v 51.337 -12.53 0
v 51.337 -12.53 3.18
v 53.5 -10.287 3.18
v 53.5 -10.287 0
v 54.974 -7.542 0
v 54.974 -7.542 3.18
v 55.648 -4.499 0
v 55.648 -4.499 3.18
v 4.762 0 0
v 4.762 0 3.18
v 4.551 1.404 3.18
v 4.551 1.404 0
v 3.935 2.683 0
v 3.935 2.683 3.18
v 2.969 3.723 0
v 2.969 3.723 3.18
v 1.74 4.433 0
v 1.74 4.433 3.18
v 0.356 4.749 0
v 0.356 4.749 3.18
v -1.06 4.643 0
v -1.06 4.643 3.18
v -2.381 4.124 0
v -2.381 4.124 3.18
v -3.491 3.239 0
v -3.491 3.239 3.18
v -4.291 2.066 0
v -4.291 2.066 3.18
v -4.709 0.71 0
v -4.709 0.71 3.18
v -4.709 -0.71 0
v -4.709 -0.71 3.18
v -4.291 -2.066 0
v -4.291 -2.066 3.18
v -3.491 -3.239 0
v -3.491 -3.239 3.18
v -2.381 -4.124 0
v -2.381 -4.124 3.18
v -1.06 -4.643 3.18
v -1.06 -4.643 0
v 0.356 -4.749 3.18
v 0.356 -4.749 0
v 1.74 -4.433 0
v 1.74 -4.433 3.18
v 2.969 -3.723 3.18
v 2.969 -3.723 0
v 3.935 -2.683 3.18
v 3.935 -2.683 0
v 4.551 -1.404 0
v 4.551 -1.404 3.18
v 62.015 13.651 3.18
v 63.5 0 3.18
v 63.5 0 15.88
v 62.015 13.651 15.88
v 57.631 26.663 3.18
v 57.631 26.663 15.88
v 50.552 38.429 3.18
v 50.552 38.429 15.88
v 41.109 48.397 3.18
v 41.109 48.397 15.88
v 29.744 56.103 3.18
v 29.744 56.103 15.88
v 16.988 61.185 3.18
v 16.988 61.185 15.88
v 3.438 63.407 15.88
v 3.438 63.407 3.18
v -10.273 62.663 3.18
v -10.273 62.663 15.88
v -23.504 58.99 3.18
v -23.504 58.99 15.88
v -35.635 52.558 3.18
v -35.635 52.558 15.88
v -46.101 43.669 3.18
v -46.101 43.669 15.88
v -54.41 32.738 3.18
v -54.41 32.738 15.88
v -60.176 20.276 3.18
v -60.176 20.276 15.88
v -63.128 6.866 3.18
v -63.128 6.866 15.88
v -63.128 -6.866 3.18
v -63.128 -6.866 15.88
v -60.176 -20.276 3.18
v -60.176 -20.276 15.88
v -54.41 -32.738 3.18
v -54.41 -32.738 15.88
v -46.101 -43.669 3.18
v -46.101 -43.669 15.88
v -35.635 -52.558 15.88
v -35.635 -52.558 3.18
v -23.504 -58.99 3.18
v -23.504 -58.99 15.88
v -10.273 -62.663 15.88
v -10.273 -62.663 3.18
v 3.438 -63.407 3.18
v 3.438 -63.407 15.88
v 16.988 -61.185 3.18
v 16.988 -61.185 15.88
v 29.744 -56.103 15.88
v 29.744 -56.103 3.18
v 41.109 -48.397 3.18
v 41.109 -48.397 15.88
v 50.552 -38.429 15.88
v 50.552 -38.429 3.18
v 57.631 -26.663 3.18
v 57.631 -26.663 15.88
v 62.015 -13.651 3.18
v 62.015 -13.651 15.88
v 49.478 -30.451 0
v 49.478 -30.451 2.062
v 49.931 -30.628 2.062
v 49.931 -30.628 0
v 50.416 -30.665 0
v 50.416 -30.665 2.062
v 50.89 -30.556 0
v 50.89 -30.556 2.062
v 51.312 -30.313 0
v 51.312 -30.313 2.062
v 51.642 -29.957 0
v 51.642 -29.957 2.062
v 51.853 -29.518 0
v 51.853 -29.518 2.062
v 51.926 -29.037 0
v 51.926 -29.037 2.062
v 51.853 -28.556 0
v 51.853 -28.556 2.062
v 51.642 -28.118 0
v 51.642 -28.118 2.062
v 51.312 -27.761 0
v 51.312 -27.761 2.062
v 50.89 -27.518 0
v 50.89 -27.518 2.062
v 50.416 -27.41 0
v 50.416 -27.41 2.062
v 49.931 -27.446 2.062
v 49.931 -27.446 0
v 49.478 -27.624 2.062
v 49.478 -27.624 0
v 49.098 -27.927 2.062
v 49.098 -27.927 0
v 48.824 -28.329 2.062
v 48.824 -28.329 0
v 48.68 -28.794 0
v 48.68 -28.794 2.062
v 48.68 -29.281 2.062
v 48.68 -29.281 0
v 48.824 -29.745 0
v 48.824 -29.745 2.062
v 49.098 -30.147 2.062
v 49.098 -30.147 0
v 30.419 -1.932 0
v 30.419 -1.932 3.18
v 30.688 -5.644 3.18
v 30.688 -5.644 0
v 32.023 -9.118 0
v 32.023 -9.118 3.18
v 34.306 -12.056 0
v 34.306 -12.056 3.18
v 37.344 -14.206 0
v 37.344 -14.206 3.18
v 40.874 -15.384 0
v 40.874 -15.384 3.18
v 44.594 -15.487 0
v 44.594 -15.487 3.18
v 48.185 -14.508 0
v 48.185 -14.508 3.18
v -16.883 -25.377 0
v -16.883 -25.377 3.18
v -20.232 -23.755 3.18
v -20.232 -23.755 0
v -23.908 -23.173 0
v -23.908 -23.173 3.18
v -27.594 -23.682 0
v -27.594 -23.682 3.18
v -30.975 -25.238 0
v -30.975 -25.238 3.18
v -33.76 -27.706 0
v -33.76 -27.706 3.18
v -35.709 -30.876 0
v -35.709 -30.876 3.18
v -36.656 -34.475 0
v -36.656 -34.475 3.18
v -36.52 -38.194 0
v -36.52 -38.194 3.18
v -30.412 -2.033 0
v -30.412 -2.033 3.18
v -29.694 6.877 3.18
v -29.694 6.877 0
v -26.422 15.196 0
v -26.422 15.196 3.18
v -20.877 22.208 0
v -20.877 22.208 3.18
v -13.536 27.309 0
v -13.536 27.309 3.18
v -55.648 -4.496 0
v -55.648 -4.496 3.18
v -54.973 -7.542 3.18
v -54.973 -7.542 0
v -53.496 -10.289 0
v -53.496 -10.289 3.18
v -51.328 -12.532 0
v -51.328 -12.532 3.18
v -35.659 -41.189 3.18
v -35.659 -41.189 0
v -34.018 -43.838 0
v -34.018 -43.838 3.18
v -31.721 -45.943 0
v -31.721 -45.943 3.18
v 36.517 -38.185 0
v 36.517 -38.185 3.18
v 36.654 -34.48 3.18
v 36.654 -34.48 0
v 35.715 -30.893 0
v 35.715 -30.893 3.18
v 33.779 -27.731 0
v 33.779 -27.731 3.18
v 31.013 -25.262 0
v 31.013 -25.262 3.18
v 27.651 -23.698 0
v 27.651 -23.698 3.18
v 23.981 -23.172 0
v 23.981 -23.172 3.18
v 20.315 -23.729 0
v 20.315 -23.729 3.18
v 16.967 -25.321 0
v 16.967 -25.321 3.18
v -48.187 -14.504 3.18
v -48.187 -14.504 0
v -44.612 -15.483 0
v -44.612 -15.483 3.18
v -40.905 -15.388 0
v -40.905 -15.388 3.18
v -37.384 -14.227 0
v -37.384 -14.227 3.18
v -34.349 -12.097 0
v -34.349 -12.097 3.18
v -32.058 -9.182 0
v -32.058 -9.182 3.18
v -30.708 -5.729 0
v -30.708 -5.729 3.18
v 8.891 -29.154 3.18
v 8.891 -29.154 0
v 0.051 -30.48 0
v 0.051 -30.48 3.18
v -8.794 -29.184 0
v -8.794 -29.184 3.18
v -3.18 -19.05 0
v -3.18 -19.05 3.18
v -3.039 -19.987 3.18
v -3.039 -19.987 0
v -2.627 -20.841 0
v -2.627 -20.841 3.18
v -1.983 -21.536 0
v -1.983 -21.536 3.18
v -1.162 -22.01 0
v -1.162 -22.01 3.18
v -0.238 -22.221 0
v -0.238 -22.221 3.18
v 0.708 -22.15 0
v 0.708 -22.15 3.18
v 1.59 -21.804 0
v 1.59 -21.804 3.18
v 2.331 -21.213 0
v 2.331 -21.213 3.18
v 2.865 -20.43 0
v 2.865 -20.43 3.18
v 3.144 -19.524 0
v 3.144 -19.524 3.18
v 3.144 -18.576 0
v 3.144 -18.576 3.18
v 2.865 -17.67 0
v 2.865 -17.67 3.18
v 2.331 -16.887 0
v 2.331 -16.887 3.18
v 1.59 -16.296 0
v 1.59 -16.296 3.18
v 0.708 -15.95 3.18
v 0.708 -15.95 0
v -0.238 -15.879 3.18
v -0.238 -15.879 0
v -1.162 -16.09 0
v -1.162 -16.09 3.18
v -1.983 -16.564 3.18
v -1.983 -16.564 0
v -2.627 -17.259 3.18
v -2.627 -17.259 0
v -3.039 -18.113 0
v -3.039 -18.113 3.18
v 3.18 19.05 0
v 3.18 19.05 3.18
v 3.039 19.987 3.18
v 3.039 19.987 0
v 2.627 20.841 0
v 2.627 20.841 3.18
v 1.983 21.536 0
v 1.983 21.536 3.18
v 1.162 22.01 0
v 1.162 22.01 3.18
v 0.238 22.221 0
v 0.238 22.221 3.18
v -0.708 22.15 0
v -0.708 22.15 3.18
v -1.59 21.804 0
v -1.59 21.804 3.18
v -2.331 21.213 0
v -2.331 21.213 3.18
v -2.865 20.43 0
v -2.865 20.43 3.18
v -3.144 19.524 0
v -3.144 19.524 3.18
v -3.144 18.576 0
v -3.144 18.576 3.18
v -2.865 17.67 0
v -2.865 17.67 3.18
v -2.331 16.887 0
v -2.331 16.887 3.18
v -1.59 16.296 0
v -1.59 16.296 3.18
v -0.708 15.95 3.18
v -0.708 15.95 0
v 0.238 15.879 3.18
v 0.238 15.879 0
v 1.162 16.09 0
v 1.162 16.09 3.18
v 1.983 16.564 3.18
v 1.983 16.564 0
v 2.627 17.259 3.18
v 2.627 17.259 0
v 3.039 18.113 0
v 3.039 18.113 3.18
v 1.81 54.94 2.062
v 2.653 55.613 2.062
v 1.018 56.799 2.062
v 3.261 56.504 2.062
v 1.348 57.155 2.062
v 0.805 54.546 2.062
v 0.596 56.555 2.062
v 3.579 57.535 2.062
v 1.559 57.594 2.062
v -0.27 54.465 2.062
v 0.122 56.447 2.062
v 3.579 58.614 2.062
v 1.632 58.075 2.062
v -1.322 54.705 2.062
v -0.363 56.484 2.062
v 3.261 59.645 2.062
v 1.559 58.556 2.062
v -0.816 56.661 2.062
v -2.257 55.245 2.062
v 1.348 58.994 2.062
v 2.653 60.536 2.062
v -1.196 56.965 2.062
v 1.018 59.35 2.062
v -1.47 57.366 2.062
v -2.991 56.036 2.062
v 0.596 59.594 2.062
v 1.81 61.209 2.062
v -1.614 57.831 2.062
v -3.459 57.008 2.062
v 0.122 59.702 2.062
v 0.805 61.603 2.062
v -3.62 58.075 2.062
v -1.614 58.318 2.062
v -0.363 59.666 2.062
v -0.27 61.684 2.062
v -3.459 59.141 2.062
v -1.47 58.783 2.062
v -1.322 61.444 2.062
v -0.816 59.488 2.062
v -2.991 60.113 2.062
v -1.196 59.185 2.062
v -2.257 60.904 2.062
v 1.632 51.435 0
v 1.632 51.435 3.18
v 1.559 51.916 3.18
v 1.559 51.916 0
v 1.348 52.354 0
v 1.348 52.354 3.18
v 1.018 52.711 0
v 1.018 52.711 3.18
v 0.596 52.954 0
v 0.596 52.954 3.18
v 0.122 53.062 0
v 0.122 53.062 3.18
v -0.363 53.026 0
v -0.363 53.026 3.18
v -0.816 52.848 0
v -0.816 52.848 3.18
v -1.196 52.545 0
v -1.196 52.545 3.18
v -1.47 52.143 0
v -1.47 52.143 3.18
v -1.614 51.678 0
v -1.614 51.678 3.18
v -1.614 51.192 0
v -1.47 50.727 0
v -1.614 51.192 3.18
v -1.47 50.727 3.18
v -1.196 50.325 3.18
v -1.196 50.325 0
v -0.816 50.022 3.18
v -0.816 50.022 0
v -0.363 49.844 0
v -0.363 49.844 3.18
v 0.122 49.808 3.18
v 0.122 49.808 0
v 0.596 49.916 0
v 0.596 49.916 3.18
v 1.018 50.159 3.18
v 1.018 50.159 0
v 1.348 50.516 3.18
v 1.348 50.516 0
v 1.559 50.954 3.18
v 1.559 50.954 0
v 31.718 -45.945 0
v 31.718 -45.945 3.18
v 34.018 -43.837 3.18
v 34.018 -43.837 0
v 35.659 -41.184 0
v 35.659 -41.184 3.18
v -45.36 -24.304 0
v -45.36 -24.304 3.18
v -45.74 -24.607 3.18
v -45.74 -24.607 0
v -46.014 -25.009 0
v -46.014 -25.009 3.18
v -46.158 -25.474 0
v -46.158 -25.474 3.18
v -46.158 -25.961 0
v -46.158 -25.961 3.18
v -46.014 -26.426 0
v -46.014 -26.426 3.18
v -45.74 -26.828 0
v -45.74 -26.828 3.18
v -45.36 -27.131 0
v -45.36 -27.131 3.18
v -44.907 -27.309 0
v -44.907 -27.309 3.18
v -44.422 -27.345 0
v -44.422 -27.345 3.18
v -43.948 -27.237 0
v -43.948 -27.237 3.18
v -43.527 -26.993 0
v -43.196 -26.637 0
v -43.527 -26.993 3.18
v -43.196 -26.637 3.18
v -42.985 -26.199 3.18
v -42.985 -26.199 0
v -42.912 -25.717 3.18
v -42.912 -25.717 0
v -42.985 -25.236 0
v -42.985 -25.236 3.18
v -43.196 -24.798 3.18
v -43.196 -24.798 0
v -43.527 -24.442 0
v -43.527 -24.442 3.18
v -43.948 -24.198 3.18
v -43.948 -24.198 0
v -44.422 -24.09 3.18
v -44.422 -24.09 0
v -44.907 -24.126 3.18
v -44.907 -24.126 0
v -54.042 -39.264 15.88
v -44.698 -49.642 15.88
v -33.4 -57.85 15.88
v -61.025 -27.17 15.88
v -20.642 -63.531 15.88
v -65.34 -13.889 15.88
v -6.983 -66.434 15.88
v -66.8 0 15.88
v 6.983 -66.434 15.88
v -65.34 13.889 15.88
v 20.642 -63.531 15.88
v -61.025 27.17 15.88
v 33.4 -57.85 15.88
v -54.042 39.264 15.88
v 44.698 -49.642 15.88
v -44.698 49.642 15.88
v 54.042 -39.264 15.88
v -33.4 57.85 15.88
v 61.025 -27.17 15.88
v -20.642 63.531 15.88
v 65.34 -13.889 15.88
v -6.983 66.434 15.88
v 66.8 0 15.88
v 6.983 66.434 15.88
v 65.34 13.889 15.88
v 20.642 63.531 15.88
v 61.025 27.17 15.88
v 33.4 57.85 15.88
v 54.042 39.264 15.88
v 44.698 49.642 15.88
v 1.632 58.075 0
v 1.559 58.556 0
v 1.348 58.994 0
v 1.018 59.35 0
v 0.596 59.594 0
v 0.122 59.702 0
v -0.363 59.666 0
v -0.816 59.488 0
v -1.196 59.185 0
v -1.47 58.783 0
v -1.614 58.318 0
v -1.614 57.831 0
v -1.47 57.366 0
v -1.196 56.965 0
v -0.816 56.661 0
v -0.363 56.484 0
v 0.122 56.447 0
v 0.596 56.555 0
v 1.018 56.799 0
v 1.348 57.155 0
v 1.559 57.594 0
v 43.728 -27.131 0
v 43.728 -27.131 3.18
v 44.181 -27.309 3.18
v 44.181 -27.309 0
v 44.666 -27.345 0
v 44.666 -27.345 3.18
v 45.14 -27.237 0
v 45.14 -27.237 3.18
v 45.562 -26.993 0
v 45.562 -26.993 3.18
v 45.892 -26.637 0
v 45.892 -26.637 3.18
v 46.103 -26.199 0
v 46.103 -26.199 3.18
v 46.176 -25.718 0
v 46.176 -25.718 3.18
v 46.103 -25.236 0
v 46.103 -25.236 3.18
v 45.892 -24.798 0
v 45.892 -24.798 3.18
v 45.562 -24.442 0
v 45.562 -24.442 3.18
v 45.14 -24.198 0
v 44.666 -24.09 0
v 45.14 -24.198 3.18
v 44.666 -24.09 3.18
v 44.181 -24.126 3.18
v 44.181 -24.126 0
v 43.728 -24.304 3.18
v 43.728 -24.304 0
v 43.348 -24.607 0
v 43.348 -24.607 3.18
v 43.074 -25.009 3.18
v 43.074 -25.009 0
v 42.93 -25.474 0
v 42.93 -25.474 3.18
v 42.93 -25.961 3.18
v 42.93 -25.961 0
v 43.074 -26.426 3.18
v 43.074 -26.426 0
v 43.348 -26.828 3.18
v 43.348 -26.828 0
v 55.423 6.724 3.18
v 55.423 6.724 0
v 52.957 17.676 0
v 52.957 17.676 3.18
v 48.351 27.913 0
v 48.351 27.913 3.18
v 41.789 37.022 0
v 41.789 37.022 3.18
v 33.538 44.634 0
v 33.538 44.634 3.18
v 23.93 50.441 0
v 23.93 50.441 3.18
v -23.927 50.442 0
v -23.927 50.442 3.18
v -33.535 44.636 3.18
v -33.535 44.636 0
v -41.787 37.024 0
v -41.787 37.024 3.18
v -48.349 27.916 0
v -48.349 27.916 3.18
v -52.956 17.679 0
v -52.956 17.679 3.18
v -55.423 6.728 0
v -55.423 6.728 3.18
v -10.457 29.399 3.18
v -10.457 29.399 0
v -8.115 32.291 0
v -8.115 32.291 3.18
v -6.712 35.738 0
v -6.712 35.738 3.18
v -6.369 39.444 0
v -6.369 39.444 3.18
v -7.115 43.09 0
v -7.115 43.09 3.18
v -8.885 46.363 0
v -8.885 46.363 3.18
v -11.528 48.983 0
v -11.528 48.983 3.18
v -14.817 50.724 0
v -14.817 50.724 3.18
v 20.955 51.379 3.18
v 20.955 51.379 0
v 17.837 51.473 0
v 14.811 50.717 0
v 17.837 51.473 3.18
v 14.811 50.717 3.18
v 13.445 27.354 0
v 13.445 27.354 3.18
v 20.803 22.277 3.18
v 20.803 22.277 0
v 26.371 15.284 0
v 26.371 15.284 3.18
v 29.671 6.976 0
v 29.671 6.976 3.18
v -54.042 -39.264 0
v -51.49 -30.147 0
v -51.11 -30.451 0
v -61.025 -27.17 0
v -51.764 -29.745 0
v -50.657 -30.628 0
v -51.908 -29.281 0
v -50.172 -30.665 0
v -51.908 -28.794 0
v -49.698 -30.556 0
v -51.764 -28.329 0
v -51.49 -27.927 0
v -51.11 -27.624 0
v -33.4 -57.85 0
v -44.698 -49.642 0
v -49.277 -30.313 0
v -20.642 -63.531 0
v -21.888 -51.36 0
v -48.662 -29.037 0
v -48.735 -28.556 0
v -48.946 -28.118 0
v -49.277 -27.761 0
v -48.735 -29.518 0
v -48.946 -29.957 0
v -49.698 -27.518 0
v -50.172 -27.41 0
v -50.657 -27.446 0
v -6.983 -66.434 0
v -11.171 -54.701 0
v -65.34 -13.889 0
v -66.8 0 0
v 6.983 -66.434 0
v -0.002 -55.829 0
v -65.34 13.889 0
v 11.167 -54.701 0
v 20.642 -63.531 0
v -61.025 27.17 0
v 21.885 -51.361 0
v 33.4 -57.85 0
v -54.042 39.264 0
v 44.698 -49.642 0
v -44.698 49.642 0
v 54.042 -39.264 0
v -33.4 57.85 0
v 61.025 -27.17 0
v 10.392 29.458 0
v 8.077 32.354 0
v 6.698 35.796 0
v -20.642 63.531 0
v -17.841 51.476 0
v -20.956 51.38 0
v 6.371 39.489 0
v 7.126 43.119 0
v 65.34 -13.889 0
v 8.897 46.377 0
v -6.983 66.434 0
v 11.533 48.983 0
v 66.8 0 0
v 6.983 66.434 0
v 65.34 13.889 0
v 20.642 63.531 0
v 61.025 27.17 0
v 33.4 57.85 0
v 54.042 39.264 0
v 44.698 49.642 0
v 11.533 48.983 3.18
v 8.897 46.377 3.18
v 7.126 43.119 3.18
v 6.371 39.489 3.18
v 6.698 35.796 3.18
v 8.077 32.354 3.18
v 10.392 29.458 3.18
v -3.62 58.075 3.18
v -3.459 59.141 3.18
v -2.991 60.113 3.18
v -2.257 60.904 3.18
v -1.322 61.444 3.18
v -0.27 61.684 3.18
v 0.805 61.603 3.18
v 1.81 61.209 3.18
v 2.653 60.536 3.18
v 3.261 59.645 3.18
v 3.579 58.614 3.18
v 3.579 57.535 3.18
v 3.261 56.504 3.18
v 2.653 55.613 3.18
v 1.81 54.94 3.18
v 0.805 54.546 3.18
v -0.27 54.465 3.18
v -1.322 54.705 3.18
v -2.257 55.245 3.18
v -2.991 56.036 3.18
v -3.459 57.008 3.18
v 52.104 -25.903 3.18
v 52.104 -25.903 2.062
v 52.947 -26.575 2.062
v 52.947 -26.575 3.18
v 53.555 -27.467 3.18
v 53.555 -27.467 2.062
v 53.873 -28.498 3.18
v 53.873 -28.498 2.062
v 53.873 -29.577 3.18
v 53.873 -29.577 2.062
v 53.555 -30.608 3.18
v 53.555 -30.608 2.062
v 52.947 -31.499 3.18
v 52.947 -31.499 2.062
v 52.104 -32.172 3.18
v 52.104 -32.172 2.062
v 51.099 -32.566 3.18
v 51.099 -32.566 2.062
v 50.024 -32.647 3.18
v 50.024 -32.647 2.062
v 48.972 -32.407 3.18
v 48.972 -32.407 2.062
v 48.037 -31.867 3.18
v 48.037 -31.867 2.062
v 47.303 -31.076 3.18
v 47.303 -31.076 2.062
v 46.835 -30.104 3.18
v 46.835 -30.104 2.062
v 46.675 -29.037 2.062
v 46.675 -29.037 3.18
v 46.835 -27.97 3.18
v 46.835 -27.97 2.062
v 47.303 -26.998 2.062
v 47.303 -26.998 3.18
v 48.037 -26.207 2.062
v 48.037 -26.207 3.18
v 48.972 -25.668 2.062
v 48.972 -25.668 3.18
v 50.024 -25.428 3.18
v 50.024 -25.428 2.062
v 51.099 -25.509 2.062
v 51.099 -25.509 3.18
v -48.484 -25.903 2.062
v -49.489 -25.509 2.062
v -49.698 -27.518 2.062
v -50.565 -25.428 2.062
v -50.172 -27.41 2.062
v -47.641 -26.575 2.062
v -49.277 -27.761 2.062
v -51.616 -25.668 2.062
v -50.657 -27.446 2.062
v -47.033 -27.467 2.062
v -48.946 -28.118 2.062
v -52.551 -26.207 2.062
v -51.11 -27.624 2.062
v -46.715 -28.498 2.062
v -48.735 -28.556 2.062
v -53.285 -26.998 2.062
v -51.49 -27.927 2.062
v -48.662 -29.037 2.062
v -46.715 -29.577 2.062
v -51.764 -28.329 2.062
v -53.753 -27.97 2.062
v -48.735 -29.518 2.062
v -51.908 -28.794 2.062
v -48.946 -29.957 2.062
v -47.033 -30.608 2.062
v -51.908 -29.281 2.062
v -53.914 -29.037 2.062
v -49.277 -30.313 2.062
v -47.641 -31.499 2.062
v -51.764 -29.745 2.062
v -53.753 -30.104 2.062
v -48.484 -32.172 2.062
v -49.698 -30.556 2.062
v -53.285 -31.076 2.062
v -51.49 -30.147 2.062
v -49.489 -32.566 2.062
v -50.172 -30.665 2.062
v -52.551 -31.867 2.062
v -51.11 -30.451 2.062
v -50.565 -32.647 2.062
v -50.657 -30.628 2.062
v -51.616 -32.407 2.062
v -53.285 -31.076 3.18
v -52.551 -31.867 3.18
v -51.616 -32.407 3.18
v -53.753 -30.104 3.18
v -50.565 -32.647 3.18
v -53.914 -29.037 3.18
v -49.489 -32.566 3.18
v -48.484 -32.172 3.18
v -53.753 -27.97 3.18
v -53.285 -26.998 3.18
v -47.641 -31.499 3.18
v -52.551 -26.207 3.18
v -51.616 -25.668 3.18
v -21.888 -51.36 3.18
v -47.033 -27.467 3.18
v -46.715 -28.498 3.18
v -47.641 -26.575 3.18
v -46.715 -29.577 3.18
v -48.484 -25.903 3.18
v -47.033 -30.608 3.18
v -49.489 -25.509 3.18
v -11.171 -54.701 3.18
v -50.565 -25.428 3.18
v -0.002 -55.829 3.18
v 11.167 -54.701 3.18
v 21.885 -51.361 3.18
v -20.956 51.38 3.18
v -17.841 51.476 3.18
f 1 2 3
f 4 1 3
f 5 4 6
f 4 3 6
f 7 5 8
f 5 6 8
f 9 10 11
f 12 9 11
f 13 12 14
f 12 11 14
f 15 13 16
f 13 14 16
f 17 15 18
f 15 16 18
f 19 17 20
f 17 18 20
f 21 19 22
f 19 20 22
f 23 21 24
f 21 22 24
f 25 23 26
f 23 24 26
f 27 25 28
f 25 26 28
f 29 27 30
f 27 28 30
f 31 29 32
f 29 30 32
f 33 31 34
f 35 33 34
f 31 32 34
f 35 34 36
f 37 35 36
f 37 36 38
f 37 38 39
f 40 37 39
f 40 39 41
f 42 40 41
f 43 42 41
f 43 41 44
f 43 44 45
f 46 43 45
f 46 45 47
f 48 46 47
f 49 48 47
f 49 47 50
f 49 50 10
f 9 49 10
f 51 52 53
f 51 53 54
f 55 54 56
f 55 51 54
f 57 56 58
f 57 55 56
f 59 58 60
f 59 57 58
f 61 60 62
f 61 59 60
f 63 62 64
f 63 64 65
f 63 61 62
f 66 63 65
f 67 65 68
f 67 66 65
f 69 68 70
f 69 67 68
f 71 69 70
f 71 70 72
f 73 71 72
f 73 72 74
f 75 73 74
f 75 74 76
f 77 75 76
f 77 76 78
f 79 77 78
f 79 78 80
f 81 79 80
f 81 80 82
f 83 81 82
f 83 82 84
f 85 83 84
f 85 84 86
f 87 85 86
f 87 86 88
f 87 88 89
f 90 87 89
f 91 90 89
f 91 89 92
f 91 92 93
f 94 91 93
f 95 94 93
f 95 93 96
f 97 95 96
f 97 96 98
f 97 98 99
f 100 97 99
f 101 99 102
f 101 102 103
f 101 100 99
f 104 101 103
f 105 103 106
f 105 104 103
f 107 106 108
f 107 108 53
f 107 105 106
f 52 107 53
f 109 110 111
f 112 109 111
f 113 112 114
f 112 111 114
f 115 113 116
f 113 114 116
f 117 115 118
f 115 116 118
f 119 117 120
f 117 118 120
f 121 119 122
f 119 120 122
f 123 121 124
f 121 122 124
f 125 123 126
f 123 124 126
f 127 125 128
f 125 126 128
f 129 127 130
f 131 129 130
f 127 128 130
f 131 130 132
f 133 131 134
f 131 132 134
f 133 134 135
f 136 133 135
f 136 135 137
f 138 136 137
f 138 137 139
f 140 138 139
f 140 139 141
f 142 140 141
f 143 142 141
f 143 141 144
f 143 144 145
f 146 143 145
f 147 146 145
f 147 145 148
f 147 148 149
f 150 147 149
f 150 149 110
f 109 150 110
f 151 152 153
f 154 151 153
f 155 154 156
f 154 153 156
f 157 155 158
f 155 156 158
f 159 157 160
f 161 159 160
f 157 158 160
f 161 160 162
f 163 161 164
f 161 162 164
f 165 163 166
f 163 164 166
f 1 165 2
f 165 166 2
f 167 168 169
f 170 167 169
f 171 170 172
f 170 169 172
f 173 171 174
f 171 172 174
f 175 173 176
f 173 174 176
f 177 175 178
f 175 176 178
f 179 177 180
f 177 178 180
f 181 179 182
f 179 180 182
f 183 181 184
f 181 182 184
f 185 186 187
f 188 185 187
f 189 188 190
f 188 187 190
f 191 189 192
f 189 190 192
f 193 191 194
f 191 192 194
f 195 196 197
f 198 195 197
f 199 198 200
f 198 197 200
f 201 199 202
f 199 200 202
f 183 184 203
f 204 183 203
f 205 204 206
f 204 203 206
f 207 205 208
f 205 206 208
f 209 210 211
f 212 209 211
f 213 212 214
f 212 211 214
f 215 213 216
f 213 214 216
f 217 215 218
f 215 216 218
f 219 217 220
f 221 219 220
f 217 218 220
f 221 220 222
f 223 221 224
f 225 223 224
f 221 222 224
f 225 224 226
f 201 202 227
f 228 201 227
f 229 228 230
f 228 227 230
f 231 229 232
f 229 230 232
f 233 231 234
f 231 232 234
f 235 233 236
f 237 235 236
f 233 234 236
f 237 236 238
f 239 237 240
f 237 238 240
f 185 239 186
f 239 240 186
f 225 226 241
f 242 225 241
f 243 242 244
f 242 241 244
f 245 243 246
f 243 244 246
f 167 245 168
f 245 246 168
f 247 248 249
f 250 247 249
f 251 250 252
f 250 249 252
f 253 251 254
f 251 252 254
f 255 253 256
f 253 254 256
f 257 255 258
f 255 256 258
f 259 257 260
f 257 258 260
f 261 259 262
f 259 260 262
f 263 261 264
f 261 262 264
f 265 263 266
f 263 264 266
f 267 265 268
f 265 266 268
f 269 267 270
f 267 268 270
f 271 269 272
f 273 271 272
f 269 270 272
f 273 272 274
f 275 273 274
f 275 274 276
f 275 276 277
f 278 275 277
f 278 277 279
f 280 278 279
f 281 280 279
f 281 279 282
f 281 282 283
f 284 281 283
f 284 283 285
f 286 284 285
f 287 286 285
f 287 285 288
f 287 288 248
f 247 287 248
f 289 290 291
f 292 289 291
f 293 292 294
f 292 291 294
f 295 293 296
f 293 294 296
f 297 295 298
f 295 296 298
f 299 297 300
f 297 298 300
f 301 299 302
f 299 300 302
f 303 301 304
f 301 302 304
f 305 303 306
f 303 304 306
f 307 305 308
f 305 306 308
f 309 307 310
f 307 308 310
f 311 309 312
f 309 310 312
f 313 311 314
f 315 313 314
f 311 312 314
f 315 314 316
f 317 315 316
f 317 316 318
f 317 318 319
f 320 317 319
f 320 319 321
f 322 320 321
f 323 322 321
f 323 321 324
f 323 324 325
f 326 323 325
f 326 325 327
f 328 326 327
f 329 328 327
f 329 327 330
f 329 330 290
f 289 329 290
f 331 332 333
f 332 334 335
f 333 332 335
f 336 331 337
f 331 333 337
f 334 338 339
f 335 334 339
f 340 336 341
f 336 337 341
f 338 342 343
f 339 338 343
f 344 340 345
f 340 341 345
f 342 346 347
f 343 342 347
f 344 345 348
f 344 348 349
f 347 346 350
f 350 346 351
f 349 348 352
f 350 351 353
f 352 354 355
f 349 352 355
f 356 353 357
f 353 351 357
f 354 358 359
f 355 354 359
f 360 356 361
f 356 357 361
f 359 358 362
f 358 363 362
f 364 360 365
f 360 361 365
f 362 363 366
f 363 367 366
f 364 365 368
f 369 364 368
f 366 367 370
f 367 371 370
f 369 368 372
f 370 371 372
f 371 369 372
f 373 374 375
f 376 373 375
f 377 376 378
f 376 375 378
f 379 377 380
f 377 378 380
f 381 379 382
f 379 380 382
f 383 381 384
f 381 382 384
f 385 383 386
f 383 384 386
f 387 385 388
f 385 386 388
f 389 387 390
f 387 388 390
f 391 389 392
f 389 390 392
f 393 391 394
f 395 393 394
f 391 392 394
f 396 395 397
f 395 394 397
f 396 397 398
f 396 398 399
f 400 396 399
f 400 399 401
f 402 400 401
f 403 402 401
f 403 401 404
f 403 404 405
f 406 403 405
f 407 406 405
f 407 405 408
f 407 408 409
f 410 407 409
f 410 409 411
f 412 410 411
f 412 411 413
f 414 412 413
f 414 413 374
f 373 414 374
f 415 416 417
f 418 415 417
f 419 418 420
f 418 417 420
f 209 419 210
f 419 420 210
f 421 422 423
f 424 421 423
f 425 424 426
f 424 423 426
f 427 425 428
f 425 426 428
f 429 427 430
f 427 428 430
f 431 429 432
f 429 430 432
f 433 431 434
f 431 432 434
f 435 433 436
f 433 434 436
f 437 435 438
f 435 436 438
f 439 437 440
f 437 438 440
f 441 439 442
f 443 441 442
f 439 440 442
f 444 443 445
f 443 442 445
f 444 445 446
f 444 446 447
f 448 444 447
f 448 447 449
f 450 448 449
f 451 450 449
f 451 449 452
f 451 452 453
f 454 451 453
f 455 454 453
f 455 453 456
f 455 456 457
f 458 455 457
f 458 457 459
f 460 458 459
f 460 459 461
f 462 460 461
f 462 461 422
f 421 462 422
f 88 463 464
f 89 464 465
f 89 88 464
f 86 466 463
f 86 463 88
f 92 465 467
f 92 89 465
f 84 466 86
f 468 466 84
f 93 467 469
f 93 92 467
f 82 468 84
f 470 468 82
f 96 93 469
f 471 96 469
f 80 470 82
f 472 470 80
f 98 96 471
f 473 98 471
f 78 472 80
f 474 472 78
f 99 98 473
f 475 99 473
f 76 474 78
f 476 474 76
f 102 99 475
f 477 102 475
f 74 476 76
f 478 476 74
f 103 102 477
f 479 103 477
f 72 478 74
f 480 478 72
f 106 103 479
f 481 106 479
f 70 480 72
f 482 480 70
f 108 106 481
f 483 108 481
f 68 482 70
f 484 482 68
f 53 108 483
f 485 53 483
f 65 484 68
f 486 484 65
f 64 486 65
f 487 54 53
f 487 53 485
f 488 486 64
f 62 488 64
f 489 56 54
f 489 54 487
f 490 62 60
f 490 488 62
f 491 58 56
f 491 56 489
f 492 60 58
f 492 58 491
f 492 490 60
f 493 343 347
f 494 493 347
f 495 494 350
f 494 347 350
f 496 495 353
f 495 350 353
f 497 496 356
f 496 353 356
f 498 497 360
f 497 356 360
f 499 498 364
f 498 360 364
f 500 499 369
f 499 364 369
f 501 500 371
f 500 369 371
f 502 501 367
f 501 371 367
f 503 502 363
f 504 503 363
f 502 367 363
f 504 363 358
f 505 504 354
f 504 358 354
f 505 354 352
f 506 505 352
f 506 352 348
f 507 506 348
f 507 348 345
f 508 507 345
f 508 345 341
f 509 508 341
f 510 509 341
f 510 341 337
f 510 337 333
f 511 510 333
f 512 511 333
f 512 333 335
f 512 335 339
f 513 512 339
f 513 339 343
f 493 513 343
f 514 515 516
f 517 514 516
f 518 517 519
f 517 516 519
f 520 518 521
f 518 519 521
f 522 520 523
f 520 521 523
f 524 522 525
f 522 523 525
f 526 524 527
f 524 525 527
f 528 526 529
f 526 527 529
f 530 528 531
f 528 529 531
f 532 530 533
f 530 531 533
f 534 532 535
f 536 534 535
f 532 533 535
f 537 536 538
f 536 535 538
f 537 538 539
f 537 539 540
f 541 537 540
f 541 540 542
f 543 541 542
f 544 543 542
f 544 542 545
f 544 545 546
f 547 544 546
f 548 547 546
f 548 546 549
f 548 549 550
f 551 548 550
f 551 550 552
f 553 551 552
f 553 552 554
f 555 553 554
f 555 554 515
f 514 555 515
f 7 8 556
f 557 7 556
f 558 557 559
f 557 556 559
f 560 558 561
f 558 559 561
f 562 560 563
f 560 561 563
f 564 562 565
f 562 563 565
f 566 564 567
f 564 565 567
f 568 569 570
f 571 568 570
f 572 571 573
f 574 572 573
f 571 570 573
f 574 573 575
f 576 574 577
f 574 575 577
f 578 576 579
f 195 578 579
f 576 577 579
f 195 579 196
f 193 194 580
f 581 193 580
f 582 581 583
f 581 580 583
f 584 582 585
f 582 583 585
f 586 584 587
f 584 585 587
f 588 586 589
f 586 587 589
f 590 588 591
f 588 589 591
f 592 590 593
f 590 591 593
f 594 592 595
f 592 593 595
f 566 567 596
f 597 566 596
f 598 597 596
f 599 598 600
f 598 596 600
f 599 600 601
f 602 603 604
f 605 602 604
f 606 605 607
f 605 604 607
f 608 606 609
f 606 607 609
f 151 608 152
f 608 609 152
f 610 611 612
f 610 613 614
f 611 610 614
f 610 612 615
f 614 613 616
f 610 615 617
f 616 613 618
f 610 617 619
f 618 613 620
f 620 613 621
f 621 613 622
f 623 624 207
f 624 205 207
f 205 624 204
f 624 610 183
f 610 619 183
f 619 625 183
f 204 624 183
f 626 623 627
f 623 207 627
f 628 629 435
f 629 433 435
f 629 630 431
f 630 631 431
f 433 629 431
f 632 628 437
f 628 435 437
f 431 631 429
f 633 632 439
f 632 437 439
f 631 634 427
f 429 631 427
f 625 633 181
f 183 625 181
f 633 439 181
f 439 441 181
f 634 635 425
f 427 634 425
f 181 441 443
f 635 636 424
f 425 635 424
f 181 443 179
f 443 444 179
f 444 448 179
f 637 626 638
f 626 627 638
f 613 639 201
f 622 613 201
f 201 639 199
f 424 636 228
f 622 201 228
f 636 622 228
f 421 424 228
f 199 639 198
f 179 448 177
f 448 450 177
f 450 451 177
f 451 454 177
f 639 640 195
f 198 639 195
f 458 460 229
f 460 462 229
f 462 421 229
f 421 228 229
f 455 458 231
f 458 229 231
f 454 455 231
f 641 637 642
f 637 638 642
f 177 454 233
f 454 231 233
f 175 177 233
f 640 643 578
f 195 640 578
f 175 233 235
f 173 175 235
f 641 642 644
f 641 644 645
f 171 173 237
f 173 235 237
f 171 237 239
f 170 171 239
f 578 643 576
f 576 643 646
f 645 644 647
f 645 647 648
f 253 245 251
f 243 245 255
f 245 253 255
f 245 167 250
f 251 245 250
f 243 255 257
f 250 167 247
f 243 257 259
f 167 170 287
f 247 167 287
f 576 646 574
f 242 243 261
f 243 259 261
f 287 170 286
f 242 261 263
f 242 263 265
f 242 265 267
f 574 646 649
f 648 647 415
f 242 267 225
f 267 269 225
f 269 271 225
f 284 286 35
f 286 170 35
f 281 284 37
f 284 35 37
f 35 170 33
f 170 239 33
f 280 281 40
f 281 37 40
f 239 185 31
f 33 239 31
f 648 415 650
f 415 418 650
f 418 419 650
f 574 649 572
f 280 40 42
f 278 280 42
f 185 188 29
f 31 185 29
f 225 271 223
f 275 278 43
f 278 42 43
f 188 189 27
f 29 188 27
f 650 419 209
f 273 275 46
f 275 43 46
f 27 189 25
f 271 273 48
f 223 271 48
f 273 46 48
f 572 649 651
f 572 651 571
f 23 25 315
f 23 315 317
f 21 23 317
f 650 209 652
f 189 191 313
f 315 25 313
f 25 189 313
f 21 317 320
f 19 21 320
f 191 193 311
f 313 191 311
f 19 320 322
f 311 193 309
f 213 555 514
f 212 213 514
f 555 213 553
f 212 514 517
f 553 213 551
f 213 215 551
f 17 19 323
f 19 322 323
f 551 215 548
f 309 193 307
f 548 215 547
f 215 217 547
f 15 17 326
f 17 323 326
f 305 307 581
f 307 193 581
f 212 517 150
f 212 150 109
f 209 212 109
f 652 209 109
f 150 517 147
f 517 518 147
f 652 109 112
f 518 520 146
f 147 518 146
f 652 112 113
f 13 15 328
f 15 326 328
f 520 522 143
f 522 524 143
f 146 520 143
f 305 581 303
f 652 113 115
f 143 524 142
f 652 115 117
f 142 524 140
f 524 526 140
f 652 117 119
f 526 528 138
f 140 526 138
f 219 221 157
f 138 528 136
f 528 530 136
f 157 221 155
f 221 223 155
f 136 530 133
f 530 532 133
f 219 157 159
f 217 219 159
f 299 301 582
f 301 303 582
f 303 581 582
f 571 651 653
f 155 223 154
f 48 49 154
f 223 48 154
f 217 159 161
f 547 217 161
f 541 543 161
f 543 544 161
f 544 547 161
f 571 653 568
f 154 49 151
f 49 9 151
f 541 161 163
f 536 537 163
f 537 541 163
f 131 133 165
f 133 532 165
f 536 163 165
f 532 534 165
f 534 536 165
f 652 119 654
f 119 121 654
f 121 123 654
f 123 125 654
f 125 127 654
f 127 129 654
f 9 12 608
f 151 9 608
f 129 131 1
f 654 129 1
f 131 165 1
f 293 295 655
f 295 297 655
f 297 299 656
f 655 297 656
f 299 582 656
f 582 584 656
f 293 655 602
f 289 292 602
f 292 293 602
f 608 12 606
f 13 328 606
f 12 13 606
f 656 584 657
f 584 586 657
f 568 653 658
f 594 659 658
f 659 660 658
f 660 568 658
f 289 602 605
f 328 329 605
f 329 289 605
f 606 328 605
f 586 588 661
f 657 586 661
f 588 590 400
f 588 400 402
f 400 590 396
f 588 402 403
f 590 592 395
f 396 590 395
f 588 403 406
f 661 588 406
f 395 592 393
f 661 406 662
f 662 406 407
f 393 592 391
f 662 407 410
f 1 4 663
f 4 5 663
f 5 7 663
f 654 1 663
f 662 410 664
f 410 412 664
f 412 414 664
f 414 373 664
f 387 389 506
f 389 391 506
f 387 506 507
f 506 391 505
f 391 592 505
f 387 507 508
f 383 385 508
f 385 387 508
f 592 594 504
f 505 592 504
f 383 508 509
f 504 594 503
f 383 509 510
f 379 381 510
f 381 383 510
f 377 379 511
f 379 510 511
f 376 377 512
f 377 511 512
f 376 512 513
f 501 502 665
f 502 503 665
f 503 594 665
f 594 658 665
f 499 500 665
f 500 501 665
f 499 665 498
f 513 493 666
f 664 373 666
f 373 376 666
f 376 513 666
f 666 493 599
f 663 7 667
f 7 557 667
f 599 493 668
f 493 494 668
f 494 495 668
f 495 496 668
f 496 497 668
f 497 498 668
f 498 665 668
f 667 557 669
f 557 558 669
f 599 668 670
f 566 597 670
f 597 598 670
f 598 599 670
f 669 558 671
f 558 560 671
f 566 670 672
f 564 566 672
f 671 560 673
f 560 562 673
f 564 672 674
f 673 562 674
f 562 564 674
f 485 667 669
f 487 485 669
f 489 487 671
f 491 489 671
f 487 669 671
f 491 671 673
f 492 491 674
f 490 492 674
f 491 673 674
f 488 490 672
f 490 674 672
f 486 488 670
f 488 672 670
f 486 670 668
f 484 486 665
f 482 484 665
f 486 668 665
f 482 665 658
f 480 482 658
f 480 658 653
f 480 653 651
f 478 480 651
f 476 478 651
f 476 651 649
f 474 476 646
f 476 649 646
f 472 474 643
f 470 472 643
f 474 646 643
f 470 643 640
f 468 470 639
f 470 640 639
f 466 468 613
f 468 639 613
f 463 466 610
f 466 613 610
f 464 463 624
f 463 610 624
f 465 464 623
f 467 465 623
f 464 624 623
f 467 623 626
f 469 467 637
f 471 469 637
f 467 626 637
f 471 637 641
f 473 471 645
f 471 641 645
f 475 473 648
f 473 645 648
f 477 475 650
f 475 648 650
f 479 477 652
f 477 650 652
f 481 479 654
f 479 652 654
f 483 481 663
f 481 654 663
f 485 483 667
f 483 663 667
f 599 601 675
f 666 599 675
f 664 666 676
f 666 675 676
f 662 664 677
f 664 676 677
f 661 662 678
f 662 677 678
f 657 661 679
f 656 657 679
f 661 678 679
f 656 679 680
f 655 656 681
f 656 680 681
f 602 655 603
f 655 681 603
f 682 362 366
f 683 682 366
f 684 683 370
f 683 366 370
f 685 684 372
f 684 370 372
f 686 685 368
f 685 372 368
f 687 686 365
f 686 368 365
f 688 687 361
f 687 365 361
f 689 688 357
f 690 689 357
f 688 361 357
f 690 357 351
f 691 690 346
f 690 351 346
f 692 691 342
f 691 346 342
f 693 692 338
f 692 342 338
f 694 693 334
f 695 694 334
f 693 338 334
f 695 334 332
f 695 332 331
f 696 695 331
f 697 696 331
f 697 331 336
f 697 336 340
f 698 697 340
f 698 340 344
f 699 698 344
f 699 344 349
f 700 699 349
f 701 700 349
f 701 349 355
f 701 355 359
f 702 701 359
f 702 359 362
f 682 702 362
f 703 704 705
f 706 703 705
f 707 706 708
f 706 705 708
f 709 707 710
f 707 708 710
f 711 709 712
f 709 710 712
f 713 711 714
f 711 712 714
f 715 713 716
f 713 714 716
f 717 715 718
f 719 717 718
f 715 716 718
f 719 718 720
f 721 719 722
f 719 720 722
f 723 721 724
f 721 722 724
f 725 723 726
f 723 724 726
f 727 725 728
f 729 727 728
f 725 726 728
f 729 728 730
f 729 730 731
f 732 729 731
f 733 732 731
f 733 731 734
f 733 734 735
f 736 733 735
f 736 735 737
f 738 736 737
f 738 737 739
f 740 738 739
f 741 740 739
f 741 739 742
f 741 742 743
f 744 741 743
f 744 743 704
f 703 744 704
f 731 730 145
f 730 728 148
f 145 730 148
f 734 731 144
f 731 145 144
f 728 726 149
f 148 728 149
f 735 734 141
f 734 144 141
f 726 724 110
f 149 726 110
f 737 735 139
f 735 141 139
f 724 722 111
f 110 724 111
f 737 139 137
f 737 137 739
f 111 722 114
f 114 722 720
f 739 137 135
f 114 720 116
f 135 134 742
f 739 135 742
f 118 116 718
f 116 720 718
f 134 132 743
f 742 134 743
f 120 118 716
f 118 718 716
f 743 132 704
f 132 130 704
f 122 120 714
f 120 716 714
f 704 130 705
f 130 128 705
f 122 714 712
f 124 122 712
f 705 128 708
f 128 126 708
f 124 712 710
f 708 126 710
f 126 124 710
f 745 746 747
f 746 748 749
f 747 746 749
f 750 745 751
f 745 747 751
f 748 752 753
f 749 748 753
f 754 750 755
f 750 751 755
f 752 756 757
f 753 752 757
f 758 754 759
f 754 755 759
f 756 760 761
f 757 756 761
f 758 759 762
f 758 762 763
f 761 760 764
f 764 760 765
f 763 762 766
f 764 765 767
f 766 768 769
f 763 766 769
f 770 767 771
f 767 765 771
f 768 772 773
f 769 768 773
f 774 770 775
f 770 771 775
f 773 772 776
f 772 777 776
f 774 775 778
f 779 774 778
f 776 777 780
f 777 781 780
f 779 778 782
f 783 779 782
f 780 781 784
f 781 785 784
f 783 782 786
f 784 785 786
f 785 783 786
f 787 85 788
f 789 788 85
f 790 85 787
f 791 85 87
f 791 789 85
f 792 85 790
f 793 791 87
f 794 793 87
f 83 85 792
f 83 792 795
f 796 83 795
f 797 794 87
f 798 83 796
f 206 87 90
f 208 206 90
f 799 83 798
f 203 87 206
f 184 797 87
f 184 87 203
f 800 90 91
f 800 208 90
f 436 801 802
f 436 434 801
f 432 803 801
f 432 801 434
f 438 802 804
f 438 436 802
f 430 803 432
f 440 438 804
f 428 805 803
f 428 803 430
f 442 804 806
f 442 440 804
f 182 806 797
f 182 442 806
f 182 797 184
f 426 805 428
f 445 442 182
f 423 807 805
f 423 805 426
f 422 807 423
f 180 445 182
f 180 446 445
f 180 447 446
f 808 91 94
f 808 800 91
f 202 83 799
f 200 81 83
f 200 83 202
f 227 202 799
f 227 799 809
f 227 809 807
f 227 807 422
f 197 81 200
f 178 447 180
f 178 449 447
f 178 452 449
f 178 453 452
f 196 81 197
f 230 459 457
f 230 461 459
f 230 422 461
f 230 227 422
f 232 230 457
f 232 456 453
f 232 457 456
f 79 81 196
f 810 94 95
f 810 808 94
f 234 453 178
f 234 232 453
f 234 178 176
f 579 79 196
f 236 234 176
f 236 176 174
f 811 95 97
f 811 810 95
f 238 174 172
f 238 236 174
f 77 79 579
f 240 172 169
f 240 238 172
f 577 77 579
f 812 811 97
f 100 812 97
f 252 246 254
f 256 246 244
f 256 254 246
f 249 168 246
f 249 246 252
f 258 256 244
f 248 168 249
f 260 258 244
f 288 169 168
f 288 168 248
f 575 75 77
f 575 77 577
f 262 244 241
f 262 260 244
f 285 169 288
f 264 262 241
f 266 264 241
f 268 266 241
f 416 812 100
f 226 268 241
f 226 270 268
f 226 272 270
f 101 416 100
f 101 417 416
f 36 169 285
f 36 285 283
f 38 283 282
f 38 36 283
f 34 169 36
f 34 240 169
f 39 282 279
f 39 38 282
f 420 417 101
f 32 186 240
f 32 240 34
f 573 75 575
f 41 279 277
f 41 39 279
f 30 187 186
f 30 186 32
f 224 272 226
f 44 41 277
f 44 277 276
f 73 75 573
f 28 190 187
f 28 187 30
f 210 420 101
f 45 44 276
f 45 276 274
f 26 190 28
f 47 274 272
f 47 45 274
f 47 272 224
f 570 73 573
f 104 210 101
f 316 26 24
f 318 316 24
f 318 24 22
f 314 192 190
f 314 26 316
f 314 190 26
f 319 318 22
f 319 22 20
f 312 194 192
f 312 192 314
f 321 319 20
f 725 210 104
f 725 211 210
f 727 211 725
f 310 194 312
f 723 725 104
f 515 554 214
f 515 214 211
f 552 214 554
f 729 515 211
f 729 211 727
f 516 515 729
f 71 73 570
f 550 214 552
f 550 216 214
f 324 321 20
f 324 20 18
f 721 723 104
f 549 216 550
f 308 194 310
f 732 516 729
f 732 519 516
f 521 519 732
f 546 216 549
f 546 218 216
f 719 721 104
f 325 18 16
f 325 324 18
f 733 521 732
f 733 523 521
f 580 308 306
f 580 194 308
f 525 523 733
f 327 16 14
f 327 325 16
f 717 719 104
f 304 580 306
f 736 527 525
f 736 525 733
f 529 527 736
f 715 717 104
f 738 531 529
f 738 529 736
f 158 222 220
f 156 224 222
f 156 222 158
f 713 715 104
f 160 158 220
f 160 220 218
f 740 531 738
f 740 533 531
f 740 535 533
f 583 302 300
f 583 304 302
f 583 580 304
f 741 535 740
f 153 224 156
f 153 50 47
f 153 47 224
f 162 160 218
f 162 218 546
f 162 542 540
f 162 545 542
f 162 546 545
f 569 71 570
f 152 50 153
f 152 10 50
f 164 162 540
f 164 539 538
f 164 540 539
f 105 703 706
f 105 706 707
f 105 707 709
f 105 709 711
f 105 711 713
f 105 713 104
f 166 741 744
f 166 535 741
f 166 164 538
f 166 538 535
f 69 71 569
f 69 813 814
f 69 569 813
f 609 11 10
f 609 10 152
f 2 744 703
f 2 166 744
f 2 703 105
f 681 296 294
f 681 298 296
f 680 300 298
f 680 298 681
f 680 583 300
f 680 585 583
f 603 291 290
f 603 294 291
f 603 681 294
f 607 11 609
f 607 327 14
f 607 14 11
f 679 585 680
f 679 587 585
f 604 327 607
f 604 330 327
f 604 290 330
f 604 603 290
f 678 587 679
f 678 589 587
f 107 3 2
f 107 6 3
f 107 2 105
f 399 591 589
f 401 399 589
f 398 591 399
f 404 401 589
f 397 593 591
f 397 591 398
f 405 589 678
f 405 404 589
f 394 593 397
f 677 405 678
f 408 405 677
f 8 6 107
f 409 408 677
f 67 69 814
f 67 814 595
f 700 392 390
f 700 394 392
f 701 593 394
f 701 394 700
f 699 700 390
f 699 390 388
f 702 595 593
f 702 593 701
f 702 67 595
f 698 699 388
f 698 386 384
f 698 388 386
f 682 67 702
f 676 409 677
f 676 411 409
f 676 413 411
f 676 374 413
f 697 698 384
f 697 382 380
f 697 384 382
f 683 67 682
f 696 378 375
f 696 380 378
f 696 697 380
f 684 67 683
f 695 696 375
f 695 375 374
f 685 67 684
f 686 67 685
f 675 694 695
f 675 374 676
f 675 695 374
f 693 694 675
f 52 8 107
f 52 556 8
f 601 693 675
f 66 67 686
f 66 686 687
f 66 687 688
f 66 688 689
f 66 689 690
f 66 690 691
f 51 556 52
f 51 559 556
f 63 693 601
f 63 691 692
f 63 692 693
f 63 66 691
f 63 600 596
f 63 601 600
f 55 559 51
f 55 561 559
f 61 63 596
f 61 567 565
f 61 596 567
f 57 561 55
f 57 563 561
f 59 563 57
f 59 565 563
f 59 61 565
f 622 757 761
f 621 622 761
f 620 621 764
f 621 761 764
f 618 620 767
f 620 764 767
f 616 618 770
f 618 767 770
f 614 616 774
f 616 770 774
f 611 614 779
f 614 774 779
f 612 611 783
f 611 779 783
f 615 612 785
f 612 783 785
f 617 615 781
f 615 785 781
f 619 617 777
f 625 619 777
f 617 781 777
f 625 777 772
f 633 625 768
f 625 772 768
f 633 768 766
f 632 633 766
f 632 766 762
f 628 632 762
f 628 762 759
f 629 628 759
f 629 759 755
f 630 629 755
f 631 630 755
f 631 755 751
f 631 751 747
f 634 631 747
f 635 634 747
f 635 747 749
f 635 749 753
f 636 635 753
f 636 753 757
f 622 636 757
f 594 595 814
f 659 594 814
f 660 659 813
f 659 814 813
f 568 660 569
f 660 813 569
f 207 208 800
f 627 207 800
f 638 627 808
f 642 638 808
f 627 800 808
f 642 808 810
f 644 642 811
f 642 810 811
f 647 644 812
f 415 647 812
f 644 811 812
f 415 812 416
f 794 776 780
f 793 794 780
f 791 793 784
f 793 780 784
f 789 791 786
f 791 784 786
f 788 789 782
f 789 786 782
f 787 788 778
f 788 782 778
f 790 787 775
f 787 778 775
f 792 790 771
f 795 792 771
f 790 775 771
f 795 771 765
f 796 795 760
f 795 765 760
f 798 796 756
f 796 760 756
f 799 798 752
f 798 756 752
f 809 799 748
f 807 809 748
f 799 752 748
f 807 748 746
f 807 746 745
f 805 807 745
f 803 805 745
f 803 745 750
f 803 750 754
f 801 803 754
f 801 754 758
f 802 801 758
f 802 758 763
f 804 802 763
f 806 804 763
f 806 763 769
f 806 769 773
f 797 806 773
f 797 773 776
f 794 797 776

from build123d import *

# Parameters (mm, degrees)
SKETCH1_R                    = 66.8
SKETCH1_R_2                  = 63.5
BOSS_EXTRUDE1_DEPTH          = 15.88
SKETCH2_R                    = 63.5
BOSS_EXTRUDE2_DEPTH          = 3.18
CUT_EXTRUDE2_DEPTH           = 96.319305495
SKETCH5_R                    = 4.7625
SKETCH5_R_2                  = 3.18
CUT_EXTRUDE1_DEPTH           = 96.319305495
CIRPATTERN2_COUNT            = 3
CIRPATTERN3_COUNT            = 2
HOLE1_D                      = 3.2639
CIRPATTERN5_COUNT            = 3
CIRPATTERN5_ANGLE            = 240
HOLE2_D                      = 3.2639
CIRPATTERN6_COUNT            = 3
F_1_0_1_DIAMETER_HOLE1_D     = 7.239
F_1_0_1_DIAMETER_HOLE1_DEPTH = 1.1176
CIRPATTERN7_COUNT            = 3


with BuildPart() as part:
    # Sketch1 → Boss-Extrude1 (new body)
    with BuildSketch(Plane.XY):
        Circle(SKETCH1_R)
        Circle(SKETCH1_R_2, mode=Mode.SUBTRACT)
    extrude(amount=BOSS_EXTRUDE1_DEPTH)

    # Sketch2 → Boss-Extrude2 (add)
    with BuildSketch(Plane.XY):
        Circle(SKETCH2_R)
    extrude(amount=BOSS_EXTRUDE2_DEPTH)

    # Sketch6 → Cut-Extrude2 (cut, through all)
    with BuildSketch(Plane.XY.offset(3.18)):
        with BuildLine():
            ThreePointArc((-23.927369503, 50.442160591), (-48.348915265, 27.916177552), (-55.64814492, -4.496058651))
            ThreePointArc((-55.64814492, -4.496058651), (-54.328981929, -8.966343359), (-51.327740035, -12.532319168))
            ThreePointArc((-51.327740035, -12.532319168), (-37.384150369, -14.226795935), (-30.412116254, -2.033121978))
            ThreePointArc((-30.412116254, -2.033121978), (-26.421749263, 15.196103641), (-13.536182991, 27.309378426))
            ThreePointArc((-13.536182991, 27.309378426), (-6.368971607, 39.443915619), (-14.817446368, 50.723950466))
            ThreePointArc((-14.817446368, 50.723950466), (-19.40184977, 51.534874128), (-23.927369503, 50.442160591))
        make_face()
    cut_extrude2 = extrude(amount=-CUT_EXTRUDE2_DEPTH, mode=Mode.SUBTRACT)

    # Sketch5 → Cut-Extrude1 (cut, through all)
    with BuildSketch(Plane.XY.offset(3.18)):
        Circle(SKETCH5_R)
        with Locations((0, 19.05)):
            Circle(SKETCH5_R_2)
    cut_extrude1 = extrude(amount=-CUT_EXTRUDE1_DEPTH, mode=Mode.SUBTRACT)

    # CirPattern2: Cut-Extrude2 ×3 about axis
    cirpattern2_axis = Axis((0, 0, 0), (0, 0, 1))
    for i in range(1, CIRPATTERN2_COUNT):
        add(cut_extrude2.rotate(cirpattern2_axis, i * 360 / CIRPATTERN2_COUNT), mode=Mode.SUBTRACT)

    # CirPattern3: Cut-Extrude1 ×2 about axis
    cirpattern3_axis = Axis((0, 0, 0), (0, 0, 1))
    for i in range(1, CIRPATTERN3_COUNT):
        add(cut_extrude1.rotate(cirpattern3_axis, i * 360 / CIRPATTERN3_COUNT), mode=Mode.SUBTRACT)

    # Hole1 (through all)
    with Locations(Plane(origin=(0, 0, 0), x_dir=(-1, 0, 0), z_dir=(0, 0, -1))):
        with Locations((0, 58.07456)):
            hole1 = Hole(HOLE1_D / 2)

    # CirPattern5: Hole1 ×3 about axis
    cirpattern5_axis = Axis((0, 0, 0), (0, 0, 1))
    for i in range(1, CIRPATTERN5_COUNT):
        add(hole1.rotate(cirpattern5_axis, i * CIRPATTERN5_ANGLE / (CIRPATTERN5_COUNT - 1)), mode=Mode.SUBTRACT)

    # Hole2 (through all)
    with Locations(Plane(origin=(0, 0, 0), x_dir=(-1, 0, 0), z_dir=(0, 0, -1))):
        with Locations((0, 51.435)):
            hole2 = Hole(HOLE2_D / 2)

    # CirPattern6: Hole2 ×3 about axis
    cirpattern6_axis = Axis((0, 0, 0), (0, 0, 1))
    for i in range(1, CIRPATTERN6_COUNT):
        add(hole2.rotate(cirpattern6_axis, i * 360 / CIRPATTERN6_COUNT), mode=Mode.SUBTRACT)

    # Ø1.0 (1) Diameter Hole1
    with Locations(Plane(origin=(0, 58.07456, 3.18), x_dir=(1, 0, 0), z_dir=(0, 0, 1))):
        with Locations((0, 0)):
            f_1_0_1_diameter_hole1 = Hole(F_1_0_1_DIAMETER_HOLE1_D / 2, depth=F_1_0_1_DIAMETER_HOLE1_DEPTH)

    # CirPattern7: Ø1.0 (1) Diameter Hole1 ×3 about axis
    cirpattern7_axis = Axis((0, 0, 0), (0, 0, 1))
    for i in range(1, CIRPATTERN7_COUNT):
        add(f_1_0_1_diameter_hole1.rotate(cirpattern7_axis, i * 360 / CIRPATTERN7_COUNT), mode=Mode.SUBTRACT)


solid = part.part
